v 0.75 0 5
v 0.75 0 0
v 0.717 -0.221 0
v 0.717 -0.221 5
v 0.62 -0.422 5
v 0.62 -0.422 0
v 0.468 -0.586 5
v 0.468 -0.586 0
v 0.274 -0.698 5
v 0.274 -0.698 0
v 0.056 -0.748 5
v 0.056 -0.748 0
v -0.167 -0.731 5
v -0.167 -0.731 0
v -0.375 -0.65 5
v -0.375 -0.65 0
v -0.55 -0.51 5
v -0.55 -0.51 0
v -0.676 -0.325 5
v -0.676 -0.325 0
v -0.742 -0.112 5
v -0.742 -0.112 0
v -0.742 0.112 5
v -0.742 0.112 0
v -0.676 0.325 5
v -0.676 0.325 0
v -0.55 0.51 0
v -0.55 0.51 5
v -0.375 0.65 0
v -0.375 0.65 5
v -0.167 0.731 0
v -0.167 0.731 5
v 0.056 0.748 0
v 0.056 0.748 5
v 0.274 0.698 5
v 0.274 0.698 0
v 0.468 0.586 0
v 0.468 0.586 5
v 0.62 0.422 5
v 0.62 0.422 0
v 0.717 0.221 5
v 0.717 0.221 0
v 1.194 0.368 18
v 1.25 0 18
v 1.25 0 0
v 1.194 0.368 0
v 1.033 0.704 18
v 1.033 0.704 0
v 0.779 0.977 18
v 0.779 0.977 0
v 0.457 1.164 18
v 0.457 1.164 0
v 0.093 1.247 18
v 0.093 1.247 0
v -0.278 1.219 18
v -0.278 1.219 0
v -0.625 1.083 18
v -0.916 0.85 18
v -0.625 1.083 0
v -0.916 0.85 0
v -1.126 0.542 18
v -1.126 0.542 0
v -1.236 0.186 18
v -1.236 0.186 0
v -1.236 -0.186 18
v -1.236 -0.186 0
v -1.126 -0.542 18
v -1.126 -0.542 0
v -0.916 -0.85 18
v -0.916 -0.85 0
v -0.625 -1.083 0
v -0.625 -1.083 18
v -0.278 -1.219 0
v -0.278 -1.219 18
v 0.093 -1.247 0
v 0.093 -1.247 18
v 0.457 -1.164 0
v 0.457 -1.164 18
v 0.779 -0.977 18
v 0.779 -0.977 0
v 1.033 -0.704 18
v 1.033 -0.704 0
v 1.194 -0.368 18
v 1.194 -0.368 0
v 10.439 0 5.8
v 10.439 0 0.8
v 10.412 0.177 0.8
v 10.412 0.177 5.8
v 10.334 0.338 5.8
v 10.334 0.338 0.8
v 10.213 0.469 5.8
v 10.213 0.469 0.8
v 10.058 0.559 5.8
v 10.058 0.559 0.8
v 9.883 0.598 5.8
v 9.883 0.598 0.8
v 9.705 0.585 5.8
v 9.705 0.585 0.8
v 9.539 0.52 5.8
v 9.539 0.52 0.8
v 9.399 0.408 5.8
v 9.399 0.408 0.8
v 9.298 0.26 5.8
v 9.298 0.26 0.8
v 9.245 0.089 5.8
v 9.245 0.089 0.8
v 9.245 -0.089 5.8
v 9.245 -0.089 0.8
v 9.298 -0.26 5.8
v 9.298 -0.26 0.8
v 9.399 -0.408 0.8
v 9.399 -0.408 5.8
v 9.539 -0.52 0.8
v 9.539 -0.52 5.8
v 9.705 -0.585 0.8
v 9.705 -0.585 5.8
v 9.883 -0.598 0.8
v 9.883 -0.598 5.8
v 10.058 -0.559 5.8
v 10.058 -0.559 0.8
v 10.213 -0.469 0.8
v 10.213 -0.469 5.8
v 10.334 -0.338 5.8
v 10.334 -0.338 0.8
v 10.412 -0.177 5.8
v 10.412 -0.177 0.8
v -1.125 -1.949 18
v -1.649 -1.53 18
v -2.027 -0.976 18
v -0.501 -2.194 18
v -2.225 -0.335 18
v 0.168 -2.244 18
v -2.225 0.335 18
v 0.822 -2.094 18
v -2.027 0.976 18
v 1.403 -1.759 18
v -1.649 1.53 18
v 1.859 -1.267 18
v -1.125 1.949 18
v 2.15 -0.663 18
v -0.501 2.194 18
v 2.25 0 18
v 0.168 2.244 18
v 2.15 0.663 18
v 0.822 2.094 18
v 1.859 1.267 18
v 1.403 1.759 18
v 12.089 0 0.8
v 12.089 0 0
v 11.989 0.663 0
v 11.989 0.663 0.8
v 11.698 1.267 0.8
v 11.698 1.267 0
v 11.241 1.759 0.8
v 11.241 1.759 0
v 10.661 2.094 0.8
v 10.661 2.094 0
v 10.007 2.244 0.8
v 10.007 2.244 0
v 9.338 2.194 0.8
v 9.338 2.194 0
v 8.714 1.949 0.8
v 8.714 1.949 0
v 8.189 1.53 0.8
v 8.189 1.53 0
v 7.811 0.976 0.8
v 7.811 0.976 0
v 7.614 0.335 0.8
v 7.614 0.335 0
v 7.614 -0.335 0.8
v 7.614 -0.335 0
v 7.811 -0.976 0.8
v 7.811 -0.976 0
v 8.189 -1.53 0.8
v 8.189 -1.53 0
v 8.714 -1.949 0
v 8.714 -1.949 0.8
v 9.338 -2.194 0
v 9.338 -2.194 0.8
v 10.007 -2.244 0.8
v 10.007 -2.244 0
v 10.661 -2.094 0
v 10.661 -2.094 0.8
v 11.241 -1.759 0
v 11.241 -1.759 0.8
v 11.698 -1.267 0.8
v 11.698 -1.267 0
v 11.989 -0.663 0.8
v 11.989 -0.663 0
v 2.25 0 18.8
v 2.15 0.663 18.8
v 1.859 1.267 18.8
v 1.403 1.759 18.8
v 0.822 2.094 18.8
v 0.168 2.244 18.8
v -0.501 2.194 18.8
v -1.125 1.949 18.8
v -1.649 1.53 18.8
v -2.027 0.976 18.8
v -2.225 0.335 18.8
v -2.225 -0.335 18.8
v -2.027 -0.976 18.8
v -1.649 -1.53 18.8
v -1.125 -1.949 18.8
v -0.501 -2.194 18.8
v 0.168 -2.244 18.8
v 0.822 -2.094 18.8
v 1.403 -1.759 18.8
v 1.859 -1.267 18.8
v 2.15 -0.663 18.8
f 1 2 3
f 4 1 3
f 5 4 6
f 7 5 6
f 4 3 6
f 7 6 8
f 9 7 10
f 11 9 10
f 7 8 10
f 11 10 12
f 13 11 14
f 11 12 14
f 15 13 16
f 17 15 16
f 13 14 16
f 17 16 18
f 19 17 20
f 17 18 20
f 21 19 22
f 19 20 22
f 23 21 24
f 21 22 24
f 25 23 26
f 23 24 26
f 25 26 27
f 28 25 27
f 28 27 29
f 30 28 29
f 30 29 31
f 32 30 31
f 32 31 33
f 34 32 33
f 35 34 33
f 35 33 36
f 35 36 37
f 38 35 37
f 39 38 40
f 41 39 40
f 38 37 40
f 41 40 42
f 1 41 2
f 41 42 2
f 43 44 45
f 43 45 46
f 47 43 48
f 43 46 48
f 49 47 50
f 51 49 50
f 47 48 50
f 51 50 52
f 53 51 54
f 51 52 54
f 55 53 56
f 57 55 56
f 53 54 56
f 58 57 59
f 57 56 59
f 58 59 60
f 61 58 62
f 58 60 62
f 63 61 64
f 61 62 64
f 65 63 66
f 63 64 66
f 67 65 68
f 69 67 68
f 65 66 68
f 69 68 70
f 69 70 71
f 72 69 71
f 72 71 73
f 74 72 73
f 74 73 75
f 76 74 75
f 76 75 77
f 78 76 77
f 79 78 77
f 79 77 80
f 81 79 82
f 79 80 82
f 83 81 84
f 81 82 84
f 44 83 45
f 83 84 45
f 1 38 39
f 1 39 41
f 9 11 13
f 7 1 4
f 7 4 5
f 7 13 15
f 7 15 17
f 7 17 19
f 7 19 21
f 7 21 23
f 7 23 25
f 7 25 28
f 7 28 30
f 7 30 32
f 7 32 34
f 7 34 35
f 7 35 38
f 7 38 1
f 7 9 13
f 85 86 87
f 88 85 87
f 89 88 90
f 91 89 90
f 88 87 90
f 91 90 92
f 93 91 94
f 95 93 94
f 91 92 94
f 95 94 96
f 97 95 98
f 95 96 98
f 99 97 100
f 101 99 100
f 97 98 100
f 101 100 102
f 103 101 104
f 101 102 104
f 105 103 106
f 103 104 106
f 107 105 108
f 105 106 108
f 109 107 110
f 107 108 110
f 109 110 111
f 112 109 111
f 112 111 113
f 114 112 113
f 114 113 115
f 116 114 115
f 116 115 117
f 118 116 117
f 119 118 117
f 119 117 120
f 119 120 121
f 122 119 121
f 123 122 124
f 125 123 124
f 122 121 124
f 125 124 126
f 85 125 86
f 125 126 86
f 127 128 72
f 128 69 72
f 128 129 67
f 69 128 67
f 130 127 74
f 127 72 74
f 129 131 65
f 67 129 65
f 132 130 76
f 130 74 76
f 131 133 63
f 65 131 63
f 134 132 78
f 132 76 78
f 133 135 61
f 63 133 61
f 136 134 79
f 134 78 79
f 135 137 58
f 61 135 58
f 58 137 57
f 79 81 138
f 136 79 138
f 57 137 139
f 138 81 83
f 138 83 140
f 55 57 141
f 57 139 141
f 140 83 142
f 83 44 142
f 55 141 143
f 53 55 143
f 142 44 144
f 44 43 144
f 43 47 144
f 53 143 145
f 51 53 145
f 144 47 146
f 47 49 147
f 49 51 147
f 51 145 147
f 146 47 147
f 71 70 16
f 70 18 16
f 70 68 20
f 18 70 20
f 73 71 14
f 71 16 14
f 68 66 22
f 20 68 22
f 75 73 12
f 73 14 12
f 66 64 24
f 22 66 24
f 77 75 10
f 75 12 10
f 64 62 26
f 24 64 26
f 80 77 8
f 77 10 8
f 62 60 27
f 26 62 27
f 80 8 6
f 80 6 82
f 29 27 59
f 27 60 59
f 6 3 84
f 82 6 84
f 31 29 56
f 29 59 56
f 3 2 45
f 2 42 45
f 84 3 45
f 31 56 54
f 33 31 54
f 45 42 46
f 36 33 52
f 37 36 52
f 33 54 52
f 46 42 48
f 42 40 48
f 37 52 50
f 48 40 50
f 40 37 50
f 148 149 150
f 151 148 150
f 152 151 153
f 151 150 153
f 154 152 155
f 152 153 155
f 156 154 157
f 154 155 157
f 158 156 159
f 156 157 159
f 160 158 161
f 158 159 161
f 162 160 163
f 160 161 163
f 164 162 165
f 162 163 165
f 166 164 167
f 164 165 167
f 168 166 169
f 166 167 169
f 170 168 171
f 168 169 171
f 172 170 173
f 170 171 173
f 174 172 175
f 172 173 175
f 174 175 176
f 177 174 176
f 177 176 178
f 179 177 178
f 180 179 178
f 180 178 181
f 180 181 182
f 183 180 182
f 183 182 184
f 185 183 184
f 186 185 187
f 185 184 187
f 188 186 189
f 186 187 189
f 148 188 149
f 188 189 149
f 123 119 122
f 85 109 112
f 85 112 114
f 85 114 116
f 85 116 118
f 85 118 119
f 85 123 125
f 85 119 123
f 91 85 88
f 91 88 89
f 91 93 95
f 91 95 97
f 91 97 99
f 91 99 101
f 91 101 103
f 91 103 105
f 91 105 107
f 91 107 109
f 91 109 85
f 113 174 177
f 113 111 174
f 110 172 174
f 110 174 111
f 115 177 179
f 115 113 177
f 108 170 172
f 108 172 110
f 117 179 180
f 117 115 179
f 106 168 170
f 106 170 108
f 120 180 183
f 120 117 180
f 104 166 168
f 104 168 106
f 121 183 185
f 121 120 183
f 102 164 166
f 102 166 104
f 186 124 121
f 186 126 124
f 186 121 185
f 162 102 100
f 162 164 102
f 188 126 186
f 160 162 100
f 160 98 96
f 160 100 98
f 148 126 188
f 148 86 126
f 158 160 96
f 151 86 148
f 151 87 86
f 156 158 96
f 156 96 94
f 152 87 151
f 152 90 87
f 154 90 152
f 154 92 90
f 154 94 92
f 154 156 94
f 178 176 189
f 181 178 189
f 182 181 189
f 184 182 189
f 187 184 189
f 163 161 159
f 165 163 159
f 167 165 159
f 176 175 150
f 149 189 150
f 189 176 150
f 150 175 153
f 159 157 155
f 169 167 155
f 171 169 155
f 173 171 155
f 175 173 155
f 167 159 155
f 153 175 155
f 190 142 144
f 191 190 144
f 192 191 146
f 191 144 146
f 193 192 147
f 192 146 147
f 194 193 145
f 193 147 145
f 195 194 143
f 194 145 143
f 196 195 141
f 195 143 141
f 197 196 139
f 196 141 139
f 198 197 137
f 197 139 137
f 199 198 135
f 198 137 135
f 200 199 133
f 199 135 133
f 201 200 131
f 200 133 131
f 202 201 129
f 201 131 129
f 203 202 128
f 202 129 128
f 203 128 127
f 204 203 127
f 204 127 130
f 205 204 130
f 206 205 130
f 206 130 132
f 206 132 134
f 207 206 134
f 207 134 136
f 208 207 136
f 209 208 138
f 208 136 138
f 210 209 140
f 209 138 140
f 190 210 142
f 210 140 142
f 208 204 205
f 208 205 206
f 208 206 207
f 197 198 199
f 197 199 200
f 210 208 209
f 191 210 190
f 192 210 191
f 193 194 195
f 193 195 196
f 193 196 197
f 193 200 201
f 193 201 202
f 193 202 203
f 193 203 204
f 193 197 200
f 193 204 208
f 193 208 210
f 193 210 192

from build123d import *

# Parameters (mm, degrees)
F0_R      = 1.25
F1_DEPTH  = 18
F2_R      = 2.25
F3_DEPTH  = 0.8
F5_R      = 0.75
F6_DEPTH  = 5
F7_R      = 2.25
F8_DEPTH  = 0.8
F9_R      = 0.6
F10_DEPTH = 5


with BuildPart() as f1:
    # F0 (on Top) → F1 (new body)
    with BuildSketch(Plane.XY):
        Circle(F0_R)
    extrude(amount=F1_DEPTH)

    # F2 (on face) → F3 (join)
    with BuildSketch(Plane.XY.offset(18)):
        Circle(F2_R)
        with BuildLine():
            ThreePointArc((0, -1.25), (-1.25, 0), (0, 1.25))
            ThreePointArc((0, 1.25), (0.8838834765, 0.8838834765), (1.25, 0))
            ThreePointArc((1.25, 0), (0.8838834765, -0.8838834765), (0, -1.25))
        make_face(mode=Mode.SUBTRACT)
        with BuildLine():
            ThreePointArc((1.25, 0), (0.8838834765, 0.8838834765), (0, 1.25))
            Line((0, 1.25), (0, -1.25))
            ThreePointArc((0, -1.25), (0.8838834765, -0.8838834765), (1.25, 0))
        make_face()
        with BuildLine():
            Line((0, -1.25), (0, 1.25))
            ThreePointArc((0, 1.25), (-1.25, 0), (0, -1.25))
        make_face()
    extrude(amount=F3_DEPTH)

    # F5 (on face) → F6 (cut)
    with BuildSketch(Plane(origin=(0, 0, 0), x_dir=(1, 0, 0), z_dir=(0, 0, -1))):
        Circle(F5_R)
    extrude(amount=-F6_DEPTH, mode=Mode.SUBTRACT)


with BuildPart() as f8:
    # F7 (on Top) → F8 (new body)
    with BuildSketch(Plane.XY):
        with Locations((9.8385168239, 0)):
            Circle(F7_R)
    extrude(amount=F8_DEPTH)

    # F9 (on face) → F10 (join)
    with BuildSketch(Plane.XY.offset(0.8)):
        with Locations((9.8385168239, 0)):
            Circle(F9_R)
    extrude(amount=F10_DEPTH)


solid = Compound([f1.part, f8.part])
